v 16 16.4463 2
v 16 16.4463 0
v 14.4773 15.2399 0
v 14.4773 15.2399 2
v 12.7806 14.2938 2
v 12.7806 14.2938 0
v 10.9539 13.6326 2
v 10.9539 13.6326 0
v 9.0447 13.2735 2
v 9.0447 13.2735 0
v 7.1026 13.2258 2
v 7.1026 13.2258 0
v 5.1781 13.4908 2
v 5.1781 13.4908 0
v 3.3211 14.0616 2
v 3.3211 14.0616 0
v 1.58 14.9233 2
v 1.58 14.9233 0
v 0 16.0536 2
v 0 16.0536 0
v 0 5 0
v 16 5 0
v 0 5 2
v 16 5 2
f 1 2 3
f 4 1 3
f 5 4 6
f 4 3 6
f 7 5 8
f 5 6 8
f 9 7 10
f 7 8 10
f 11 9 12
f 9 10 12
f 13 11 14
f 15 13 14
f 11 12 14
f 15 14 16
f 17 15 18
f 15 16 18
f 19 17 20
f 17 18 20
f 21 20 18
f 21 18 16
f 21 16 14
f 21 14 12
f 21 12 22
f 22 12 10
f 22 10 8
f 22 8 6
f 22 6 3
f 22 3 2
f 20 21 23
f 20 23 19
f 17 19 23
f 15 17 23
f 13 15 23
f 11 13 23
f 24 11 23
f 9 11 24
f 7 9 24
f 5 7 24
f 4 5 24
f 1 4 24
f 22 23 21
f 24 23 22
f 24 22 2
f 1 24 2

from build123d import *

# Parameters (mm, degrees)
SZKIC1_W                    = 16
SZKIC1_H                    = 31.855734842
DODANIE_WYCI_GNI_CIE1_DEPTH = 2
SZKIC2_W                    = 16
SZKIC2_H                    = 5
WYTNIJ_WYCI_GNI_CIE1_DEPTH  = 5
WYTNIJ_WYCI_GNI_CIE2_DEPTH  = 10
WYTNIJ_WYCI_GNI_CIE3_DEPTH  = 10


with BuildPart() as part:
    # Szkic1 → Dodanie-wyciągnięcie1 (new body)
    with BuildSketch(Plane.XY):
        with Locations((8, 15.927867421)):
            Rectangle(SZKIC1_W, SZKIC1_H)
    extrude(amount=DODANIE_WYCI_GNI_CIE1_DEPTH)

    # Szkic2 → Wytnij-wyciągnięcie1 (cut)
    with BuildSketch(Plane.XY.offset(2)):
        with Locations((8, 2.5)):
            Rectangle(SZKIC2_W, SZKIC2_H)
    extrude(amount=-WYTNIJ_WYCI_GNI_CIE1_DEPTH, mode=Mode.SUBTRACT)

    # Szkic6 → Wytnij-wyciągnięcie2 (cut)
    with BuildSketch(Plane(origin=(0, 0, 0), x_dir=(-1, 0, 0), z_dir=(0, 0, -1))):
        with BuildLine():
            Line((0, 31.855734842), (-16, 31.855734842))
            Line((-16, 31.855734842), (-16, 18.750886073))
            ThreePointArc((-16, 18.750886073), (-8.06030582, 15.602264045), (0, 18.427867421))
            Line((0, 18.427867421), (0, 31.855734842))
        make_face()
    extrude(amount=-WYTNIJ_WYCI_GNI_CIE2_DEPTH, mode=Mode.SUBTRACT)

    # Szkic8 → Wytnij-wyciągnięcie3 (cut)
    with BuildSketch(Plane(origin=(0, 0, 0), x_dir=(-1, 0, 0), z_dir=(0, 0, -1))):
        with BuildLine():
            Line((-16, 18.750886073), (-16, 16.446330699))
            ThreePointArc((-16, 16.446330699), (-8.074613492, 13.210416858), (0, 16.05356769))
            Line((0, 16.05356769), (0, 18.427867421))
            Line((0, 18.427867421), (-16, 18.750886073))
        make_face()
    extrude(amount=-WYTNIJ_WYCI_GNI_CIE3_DEPTH, mode=Mode.SUBTRACT)


solid = part.part
